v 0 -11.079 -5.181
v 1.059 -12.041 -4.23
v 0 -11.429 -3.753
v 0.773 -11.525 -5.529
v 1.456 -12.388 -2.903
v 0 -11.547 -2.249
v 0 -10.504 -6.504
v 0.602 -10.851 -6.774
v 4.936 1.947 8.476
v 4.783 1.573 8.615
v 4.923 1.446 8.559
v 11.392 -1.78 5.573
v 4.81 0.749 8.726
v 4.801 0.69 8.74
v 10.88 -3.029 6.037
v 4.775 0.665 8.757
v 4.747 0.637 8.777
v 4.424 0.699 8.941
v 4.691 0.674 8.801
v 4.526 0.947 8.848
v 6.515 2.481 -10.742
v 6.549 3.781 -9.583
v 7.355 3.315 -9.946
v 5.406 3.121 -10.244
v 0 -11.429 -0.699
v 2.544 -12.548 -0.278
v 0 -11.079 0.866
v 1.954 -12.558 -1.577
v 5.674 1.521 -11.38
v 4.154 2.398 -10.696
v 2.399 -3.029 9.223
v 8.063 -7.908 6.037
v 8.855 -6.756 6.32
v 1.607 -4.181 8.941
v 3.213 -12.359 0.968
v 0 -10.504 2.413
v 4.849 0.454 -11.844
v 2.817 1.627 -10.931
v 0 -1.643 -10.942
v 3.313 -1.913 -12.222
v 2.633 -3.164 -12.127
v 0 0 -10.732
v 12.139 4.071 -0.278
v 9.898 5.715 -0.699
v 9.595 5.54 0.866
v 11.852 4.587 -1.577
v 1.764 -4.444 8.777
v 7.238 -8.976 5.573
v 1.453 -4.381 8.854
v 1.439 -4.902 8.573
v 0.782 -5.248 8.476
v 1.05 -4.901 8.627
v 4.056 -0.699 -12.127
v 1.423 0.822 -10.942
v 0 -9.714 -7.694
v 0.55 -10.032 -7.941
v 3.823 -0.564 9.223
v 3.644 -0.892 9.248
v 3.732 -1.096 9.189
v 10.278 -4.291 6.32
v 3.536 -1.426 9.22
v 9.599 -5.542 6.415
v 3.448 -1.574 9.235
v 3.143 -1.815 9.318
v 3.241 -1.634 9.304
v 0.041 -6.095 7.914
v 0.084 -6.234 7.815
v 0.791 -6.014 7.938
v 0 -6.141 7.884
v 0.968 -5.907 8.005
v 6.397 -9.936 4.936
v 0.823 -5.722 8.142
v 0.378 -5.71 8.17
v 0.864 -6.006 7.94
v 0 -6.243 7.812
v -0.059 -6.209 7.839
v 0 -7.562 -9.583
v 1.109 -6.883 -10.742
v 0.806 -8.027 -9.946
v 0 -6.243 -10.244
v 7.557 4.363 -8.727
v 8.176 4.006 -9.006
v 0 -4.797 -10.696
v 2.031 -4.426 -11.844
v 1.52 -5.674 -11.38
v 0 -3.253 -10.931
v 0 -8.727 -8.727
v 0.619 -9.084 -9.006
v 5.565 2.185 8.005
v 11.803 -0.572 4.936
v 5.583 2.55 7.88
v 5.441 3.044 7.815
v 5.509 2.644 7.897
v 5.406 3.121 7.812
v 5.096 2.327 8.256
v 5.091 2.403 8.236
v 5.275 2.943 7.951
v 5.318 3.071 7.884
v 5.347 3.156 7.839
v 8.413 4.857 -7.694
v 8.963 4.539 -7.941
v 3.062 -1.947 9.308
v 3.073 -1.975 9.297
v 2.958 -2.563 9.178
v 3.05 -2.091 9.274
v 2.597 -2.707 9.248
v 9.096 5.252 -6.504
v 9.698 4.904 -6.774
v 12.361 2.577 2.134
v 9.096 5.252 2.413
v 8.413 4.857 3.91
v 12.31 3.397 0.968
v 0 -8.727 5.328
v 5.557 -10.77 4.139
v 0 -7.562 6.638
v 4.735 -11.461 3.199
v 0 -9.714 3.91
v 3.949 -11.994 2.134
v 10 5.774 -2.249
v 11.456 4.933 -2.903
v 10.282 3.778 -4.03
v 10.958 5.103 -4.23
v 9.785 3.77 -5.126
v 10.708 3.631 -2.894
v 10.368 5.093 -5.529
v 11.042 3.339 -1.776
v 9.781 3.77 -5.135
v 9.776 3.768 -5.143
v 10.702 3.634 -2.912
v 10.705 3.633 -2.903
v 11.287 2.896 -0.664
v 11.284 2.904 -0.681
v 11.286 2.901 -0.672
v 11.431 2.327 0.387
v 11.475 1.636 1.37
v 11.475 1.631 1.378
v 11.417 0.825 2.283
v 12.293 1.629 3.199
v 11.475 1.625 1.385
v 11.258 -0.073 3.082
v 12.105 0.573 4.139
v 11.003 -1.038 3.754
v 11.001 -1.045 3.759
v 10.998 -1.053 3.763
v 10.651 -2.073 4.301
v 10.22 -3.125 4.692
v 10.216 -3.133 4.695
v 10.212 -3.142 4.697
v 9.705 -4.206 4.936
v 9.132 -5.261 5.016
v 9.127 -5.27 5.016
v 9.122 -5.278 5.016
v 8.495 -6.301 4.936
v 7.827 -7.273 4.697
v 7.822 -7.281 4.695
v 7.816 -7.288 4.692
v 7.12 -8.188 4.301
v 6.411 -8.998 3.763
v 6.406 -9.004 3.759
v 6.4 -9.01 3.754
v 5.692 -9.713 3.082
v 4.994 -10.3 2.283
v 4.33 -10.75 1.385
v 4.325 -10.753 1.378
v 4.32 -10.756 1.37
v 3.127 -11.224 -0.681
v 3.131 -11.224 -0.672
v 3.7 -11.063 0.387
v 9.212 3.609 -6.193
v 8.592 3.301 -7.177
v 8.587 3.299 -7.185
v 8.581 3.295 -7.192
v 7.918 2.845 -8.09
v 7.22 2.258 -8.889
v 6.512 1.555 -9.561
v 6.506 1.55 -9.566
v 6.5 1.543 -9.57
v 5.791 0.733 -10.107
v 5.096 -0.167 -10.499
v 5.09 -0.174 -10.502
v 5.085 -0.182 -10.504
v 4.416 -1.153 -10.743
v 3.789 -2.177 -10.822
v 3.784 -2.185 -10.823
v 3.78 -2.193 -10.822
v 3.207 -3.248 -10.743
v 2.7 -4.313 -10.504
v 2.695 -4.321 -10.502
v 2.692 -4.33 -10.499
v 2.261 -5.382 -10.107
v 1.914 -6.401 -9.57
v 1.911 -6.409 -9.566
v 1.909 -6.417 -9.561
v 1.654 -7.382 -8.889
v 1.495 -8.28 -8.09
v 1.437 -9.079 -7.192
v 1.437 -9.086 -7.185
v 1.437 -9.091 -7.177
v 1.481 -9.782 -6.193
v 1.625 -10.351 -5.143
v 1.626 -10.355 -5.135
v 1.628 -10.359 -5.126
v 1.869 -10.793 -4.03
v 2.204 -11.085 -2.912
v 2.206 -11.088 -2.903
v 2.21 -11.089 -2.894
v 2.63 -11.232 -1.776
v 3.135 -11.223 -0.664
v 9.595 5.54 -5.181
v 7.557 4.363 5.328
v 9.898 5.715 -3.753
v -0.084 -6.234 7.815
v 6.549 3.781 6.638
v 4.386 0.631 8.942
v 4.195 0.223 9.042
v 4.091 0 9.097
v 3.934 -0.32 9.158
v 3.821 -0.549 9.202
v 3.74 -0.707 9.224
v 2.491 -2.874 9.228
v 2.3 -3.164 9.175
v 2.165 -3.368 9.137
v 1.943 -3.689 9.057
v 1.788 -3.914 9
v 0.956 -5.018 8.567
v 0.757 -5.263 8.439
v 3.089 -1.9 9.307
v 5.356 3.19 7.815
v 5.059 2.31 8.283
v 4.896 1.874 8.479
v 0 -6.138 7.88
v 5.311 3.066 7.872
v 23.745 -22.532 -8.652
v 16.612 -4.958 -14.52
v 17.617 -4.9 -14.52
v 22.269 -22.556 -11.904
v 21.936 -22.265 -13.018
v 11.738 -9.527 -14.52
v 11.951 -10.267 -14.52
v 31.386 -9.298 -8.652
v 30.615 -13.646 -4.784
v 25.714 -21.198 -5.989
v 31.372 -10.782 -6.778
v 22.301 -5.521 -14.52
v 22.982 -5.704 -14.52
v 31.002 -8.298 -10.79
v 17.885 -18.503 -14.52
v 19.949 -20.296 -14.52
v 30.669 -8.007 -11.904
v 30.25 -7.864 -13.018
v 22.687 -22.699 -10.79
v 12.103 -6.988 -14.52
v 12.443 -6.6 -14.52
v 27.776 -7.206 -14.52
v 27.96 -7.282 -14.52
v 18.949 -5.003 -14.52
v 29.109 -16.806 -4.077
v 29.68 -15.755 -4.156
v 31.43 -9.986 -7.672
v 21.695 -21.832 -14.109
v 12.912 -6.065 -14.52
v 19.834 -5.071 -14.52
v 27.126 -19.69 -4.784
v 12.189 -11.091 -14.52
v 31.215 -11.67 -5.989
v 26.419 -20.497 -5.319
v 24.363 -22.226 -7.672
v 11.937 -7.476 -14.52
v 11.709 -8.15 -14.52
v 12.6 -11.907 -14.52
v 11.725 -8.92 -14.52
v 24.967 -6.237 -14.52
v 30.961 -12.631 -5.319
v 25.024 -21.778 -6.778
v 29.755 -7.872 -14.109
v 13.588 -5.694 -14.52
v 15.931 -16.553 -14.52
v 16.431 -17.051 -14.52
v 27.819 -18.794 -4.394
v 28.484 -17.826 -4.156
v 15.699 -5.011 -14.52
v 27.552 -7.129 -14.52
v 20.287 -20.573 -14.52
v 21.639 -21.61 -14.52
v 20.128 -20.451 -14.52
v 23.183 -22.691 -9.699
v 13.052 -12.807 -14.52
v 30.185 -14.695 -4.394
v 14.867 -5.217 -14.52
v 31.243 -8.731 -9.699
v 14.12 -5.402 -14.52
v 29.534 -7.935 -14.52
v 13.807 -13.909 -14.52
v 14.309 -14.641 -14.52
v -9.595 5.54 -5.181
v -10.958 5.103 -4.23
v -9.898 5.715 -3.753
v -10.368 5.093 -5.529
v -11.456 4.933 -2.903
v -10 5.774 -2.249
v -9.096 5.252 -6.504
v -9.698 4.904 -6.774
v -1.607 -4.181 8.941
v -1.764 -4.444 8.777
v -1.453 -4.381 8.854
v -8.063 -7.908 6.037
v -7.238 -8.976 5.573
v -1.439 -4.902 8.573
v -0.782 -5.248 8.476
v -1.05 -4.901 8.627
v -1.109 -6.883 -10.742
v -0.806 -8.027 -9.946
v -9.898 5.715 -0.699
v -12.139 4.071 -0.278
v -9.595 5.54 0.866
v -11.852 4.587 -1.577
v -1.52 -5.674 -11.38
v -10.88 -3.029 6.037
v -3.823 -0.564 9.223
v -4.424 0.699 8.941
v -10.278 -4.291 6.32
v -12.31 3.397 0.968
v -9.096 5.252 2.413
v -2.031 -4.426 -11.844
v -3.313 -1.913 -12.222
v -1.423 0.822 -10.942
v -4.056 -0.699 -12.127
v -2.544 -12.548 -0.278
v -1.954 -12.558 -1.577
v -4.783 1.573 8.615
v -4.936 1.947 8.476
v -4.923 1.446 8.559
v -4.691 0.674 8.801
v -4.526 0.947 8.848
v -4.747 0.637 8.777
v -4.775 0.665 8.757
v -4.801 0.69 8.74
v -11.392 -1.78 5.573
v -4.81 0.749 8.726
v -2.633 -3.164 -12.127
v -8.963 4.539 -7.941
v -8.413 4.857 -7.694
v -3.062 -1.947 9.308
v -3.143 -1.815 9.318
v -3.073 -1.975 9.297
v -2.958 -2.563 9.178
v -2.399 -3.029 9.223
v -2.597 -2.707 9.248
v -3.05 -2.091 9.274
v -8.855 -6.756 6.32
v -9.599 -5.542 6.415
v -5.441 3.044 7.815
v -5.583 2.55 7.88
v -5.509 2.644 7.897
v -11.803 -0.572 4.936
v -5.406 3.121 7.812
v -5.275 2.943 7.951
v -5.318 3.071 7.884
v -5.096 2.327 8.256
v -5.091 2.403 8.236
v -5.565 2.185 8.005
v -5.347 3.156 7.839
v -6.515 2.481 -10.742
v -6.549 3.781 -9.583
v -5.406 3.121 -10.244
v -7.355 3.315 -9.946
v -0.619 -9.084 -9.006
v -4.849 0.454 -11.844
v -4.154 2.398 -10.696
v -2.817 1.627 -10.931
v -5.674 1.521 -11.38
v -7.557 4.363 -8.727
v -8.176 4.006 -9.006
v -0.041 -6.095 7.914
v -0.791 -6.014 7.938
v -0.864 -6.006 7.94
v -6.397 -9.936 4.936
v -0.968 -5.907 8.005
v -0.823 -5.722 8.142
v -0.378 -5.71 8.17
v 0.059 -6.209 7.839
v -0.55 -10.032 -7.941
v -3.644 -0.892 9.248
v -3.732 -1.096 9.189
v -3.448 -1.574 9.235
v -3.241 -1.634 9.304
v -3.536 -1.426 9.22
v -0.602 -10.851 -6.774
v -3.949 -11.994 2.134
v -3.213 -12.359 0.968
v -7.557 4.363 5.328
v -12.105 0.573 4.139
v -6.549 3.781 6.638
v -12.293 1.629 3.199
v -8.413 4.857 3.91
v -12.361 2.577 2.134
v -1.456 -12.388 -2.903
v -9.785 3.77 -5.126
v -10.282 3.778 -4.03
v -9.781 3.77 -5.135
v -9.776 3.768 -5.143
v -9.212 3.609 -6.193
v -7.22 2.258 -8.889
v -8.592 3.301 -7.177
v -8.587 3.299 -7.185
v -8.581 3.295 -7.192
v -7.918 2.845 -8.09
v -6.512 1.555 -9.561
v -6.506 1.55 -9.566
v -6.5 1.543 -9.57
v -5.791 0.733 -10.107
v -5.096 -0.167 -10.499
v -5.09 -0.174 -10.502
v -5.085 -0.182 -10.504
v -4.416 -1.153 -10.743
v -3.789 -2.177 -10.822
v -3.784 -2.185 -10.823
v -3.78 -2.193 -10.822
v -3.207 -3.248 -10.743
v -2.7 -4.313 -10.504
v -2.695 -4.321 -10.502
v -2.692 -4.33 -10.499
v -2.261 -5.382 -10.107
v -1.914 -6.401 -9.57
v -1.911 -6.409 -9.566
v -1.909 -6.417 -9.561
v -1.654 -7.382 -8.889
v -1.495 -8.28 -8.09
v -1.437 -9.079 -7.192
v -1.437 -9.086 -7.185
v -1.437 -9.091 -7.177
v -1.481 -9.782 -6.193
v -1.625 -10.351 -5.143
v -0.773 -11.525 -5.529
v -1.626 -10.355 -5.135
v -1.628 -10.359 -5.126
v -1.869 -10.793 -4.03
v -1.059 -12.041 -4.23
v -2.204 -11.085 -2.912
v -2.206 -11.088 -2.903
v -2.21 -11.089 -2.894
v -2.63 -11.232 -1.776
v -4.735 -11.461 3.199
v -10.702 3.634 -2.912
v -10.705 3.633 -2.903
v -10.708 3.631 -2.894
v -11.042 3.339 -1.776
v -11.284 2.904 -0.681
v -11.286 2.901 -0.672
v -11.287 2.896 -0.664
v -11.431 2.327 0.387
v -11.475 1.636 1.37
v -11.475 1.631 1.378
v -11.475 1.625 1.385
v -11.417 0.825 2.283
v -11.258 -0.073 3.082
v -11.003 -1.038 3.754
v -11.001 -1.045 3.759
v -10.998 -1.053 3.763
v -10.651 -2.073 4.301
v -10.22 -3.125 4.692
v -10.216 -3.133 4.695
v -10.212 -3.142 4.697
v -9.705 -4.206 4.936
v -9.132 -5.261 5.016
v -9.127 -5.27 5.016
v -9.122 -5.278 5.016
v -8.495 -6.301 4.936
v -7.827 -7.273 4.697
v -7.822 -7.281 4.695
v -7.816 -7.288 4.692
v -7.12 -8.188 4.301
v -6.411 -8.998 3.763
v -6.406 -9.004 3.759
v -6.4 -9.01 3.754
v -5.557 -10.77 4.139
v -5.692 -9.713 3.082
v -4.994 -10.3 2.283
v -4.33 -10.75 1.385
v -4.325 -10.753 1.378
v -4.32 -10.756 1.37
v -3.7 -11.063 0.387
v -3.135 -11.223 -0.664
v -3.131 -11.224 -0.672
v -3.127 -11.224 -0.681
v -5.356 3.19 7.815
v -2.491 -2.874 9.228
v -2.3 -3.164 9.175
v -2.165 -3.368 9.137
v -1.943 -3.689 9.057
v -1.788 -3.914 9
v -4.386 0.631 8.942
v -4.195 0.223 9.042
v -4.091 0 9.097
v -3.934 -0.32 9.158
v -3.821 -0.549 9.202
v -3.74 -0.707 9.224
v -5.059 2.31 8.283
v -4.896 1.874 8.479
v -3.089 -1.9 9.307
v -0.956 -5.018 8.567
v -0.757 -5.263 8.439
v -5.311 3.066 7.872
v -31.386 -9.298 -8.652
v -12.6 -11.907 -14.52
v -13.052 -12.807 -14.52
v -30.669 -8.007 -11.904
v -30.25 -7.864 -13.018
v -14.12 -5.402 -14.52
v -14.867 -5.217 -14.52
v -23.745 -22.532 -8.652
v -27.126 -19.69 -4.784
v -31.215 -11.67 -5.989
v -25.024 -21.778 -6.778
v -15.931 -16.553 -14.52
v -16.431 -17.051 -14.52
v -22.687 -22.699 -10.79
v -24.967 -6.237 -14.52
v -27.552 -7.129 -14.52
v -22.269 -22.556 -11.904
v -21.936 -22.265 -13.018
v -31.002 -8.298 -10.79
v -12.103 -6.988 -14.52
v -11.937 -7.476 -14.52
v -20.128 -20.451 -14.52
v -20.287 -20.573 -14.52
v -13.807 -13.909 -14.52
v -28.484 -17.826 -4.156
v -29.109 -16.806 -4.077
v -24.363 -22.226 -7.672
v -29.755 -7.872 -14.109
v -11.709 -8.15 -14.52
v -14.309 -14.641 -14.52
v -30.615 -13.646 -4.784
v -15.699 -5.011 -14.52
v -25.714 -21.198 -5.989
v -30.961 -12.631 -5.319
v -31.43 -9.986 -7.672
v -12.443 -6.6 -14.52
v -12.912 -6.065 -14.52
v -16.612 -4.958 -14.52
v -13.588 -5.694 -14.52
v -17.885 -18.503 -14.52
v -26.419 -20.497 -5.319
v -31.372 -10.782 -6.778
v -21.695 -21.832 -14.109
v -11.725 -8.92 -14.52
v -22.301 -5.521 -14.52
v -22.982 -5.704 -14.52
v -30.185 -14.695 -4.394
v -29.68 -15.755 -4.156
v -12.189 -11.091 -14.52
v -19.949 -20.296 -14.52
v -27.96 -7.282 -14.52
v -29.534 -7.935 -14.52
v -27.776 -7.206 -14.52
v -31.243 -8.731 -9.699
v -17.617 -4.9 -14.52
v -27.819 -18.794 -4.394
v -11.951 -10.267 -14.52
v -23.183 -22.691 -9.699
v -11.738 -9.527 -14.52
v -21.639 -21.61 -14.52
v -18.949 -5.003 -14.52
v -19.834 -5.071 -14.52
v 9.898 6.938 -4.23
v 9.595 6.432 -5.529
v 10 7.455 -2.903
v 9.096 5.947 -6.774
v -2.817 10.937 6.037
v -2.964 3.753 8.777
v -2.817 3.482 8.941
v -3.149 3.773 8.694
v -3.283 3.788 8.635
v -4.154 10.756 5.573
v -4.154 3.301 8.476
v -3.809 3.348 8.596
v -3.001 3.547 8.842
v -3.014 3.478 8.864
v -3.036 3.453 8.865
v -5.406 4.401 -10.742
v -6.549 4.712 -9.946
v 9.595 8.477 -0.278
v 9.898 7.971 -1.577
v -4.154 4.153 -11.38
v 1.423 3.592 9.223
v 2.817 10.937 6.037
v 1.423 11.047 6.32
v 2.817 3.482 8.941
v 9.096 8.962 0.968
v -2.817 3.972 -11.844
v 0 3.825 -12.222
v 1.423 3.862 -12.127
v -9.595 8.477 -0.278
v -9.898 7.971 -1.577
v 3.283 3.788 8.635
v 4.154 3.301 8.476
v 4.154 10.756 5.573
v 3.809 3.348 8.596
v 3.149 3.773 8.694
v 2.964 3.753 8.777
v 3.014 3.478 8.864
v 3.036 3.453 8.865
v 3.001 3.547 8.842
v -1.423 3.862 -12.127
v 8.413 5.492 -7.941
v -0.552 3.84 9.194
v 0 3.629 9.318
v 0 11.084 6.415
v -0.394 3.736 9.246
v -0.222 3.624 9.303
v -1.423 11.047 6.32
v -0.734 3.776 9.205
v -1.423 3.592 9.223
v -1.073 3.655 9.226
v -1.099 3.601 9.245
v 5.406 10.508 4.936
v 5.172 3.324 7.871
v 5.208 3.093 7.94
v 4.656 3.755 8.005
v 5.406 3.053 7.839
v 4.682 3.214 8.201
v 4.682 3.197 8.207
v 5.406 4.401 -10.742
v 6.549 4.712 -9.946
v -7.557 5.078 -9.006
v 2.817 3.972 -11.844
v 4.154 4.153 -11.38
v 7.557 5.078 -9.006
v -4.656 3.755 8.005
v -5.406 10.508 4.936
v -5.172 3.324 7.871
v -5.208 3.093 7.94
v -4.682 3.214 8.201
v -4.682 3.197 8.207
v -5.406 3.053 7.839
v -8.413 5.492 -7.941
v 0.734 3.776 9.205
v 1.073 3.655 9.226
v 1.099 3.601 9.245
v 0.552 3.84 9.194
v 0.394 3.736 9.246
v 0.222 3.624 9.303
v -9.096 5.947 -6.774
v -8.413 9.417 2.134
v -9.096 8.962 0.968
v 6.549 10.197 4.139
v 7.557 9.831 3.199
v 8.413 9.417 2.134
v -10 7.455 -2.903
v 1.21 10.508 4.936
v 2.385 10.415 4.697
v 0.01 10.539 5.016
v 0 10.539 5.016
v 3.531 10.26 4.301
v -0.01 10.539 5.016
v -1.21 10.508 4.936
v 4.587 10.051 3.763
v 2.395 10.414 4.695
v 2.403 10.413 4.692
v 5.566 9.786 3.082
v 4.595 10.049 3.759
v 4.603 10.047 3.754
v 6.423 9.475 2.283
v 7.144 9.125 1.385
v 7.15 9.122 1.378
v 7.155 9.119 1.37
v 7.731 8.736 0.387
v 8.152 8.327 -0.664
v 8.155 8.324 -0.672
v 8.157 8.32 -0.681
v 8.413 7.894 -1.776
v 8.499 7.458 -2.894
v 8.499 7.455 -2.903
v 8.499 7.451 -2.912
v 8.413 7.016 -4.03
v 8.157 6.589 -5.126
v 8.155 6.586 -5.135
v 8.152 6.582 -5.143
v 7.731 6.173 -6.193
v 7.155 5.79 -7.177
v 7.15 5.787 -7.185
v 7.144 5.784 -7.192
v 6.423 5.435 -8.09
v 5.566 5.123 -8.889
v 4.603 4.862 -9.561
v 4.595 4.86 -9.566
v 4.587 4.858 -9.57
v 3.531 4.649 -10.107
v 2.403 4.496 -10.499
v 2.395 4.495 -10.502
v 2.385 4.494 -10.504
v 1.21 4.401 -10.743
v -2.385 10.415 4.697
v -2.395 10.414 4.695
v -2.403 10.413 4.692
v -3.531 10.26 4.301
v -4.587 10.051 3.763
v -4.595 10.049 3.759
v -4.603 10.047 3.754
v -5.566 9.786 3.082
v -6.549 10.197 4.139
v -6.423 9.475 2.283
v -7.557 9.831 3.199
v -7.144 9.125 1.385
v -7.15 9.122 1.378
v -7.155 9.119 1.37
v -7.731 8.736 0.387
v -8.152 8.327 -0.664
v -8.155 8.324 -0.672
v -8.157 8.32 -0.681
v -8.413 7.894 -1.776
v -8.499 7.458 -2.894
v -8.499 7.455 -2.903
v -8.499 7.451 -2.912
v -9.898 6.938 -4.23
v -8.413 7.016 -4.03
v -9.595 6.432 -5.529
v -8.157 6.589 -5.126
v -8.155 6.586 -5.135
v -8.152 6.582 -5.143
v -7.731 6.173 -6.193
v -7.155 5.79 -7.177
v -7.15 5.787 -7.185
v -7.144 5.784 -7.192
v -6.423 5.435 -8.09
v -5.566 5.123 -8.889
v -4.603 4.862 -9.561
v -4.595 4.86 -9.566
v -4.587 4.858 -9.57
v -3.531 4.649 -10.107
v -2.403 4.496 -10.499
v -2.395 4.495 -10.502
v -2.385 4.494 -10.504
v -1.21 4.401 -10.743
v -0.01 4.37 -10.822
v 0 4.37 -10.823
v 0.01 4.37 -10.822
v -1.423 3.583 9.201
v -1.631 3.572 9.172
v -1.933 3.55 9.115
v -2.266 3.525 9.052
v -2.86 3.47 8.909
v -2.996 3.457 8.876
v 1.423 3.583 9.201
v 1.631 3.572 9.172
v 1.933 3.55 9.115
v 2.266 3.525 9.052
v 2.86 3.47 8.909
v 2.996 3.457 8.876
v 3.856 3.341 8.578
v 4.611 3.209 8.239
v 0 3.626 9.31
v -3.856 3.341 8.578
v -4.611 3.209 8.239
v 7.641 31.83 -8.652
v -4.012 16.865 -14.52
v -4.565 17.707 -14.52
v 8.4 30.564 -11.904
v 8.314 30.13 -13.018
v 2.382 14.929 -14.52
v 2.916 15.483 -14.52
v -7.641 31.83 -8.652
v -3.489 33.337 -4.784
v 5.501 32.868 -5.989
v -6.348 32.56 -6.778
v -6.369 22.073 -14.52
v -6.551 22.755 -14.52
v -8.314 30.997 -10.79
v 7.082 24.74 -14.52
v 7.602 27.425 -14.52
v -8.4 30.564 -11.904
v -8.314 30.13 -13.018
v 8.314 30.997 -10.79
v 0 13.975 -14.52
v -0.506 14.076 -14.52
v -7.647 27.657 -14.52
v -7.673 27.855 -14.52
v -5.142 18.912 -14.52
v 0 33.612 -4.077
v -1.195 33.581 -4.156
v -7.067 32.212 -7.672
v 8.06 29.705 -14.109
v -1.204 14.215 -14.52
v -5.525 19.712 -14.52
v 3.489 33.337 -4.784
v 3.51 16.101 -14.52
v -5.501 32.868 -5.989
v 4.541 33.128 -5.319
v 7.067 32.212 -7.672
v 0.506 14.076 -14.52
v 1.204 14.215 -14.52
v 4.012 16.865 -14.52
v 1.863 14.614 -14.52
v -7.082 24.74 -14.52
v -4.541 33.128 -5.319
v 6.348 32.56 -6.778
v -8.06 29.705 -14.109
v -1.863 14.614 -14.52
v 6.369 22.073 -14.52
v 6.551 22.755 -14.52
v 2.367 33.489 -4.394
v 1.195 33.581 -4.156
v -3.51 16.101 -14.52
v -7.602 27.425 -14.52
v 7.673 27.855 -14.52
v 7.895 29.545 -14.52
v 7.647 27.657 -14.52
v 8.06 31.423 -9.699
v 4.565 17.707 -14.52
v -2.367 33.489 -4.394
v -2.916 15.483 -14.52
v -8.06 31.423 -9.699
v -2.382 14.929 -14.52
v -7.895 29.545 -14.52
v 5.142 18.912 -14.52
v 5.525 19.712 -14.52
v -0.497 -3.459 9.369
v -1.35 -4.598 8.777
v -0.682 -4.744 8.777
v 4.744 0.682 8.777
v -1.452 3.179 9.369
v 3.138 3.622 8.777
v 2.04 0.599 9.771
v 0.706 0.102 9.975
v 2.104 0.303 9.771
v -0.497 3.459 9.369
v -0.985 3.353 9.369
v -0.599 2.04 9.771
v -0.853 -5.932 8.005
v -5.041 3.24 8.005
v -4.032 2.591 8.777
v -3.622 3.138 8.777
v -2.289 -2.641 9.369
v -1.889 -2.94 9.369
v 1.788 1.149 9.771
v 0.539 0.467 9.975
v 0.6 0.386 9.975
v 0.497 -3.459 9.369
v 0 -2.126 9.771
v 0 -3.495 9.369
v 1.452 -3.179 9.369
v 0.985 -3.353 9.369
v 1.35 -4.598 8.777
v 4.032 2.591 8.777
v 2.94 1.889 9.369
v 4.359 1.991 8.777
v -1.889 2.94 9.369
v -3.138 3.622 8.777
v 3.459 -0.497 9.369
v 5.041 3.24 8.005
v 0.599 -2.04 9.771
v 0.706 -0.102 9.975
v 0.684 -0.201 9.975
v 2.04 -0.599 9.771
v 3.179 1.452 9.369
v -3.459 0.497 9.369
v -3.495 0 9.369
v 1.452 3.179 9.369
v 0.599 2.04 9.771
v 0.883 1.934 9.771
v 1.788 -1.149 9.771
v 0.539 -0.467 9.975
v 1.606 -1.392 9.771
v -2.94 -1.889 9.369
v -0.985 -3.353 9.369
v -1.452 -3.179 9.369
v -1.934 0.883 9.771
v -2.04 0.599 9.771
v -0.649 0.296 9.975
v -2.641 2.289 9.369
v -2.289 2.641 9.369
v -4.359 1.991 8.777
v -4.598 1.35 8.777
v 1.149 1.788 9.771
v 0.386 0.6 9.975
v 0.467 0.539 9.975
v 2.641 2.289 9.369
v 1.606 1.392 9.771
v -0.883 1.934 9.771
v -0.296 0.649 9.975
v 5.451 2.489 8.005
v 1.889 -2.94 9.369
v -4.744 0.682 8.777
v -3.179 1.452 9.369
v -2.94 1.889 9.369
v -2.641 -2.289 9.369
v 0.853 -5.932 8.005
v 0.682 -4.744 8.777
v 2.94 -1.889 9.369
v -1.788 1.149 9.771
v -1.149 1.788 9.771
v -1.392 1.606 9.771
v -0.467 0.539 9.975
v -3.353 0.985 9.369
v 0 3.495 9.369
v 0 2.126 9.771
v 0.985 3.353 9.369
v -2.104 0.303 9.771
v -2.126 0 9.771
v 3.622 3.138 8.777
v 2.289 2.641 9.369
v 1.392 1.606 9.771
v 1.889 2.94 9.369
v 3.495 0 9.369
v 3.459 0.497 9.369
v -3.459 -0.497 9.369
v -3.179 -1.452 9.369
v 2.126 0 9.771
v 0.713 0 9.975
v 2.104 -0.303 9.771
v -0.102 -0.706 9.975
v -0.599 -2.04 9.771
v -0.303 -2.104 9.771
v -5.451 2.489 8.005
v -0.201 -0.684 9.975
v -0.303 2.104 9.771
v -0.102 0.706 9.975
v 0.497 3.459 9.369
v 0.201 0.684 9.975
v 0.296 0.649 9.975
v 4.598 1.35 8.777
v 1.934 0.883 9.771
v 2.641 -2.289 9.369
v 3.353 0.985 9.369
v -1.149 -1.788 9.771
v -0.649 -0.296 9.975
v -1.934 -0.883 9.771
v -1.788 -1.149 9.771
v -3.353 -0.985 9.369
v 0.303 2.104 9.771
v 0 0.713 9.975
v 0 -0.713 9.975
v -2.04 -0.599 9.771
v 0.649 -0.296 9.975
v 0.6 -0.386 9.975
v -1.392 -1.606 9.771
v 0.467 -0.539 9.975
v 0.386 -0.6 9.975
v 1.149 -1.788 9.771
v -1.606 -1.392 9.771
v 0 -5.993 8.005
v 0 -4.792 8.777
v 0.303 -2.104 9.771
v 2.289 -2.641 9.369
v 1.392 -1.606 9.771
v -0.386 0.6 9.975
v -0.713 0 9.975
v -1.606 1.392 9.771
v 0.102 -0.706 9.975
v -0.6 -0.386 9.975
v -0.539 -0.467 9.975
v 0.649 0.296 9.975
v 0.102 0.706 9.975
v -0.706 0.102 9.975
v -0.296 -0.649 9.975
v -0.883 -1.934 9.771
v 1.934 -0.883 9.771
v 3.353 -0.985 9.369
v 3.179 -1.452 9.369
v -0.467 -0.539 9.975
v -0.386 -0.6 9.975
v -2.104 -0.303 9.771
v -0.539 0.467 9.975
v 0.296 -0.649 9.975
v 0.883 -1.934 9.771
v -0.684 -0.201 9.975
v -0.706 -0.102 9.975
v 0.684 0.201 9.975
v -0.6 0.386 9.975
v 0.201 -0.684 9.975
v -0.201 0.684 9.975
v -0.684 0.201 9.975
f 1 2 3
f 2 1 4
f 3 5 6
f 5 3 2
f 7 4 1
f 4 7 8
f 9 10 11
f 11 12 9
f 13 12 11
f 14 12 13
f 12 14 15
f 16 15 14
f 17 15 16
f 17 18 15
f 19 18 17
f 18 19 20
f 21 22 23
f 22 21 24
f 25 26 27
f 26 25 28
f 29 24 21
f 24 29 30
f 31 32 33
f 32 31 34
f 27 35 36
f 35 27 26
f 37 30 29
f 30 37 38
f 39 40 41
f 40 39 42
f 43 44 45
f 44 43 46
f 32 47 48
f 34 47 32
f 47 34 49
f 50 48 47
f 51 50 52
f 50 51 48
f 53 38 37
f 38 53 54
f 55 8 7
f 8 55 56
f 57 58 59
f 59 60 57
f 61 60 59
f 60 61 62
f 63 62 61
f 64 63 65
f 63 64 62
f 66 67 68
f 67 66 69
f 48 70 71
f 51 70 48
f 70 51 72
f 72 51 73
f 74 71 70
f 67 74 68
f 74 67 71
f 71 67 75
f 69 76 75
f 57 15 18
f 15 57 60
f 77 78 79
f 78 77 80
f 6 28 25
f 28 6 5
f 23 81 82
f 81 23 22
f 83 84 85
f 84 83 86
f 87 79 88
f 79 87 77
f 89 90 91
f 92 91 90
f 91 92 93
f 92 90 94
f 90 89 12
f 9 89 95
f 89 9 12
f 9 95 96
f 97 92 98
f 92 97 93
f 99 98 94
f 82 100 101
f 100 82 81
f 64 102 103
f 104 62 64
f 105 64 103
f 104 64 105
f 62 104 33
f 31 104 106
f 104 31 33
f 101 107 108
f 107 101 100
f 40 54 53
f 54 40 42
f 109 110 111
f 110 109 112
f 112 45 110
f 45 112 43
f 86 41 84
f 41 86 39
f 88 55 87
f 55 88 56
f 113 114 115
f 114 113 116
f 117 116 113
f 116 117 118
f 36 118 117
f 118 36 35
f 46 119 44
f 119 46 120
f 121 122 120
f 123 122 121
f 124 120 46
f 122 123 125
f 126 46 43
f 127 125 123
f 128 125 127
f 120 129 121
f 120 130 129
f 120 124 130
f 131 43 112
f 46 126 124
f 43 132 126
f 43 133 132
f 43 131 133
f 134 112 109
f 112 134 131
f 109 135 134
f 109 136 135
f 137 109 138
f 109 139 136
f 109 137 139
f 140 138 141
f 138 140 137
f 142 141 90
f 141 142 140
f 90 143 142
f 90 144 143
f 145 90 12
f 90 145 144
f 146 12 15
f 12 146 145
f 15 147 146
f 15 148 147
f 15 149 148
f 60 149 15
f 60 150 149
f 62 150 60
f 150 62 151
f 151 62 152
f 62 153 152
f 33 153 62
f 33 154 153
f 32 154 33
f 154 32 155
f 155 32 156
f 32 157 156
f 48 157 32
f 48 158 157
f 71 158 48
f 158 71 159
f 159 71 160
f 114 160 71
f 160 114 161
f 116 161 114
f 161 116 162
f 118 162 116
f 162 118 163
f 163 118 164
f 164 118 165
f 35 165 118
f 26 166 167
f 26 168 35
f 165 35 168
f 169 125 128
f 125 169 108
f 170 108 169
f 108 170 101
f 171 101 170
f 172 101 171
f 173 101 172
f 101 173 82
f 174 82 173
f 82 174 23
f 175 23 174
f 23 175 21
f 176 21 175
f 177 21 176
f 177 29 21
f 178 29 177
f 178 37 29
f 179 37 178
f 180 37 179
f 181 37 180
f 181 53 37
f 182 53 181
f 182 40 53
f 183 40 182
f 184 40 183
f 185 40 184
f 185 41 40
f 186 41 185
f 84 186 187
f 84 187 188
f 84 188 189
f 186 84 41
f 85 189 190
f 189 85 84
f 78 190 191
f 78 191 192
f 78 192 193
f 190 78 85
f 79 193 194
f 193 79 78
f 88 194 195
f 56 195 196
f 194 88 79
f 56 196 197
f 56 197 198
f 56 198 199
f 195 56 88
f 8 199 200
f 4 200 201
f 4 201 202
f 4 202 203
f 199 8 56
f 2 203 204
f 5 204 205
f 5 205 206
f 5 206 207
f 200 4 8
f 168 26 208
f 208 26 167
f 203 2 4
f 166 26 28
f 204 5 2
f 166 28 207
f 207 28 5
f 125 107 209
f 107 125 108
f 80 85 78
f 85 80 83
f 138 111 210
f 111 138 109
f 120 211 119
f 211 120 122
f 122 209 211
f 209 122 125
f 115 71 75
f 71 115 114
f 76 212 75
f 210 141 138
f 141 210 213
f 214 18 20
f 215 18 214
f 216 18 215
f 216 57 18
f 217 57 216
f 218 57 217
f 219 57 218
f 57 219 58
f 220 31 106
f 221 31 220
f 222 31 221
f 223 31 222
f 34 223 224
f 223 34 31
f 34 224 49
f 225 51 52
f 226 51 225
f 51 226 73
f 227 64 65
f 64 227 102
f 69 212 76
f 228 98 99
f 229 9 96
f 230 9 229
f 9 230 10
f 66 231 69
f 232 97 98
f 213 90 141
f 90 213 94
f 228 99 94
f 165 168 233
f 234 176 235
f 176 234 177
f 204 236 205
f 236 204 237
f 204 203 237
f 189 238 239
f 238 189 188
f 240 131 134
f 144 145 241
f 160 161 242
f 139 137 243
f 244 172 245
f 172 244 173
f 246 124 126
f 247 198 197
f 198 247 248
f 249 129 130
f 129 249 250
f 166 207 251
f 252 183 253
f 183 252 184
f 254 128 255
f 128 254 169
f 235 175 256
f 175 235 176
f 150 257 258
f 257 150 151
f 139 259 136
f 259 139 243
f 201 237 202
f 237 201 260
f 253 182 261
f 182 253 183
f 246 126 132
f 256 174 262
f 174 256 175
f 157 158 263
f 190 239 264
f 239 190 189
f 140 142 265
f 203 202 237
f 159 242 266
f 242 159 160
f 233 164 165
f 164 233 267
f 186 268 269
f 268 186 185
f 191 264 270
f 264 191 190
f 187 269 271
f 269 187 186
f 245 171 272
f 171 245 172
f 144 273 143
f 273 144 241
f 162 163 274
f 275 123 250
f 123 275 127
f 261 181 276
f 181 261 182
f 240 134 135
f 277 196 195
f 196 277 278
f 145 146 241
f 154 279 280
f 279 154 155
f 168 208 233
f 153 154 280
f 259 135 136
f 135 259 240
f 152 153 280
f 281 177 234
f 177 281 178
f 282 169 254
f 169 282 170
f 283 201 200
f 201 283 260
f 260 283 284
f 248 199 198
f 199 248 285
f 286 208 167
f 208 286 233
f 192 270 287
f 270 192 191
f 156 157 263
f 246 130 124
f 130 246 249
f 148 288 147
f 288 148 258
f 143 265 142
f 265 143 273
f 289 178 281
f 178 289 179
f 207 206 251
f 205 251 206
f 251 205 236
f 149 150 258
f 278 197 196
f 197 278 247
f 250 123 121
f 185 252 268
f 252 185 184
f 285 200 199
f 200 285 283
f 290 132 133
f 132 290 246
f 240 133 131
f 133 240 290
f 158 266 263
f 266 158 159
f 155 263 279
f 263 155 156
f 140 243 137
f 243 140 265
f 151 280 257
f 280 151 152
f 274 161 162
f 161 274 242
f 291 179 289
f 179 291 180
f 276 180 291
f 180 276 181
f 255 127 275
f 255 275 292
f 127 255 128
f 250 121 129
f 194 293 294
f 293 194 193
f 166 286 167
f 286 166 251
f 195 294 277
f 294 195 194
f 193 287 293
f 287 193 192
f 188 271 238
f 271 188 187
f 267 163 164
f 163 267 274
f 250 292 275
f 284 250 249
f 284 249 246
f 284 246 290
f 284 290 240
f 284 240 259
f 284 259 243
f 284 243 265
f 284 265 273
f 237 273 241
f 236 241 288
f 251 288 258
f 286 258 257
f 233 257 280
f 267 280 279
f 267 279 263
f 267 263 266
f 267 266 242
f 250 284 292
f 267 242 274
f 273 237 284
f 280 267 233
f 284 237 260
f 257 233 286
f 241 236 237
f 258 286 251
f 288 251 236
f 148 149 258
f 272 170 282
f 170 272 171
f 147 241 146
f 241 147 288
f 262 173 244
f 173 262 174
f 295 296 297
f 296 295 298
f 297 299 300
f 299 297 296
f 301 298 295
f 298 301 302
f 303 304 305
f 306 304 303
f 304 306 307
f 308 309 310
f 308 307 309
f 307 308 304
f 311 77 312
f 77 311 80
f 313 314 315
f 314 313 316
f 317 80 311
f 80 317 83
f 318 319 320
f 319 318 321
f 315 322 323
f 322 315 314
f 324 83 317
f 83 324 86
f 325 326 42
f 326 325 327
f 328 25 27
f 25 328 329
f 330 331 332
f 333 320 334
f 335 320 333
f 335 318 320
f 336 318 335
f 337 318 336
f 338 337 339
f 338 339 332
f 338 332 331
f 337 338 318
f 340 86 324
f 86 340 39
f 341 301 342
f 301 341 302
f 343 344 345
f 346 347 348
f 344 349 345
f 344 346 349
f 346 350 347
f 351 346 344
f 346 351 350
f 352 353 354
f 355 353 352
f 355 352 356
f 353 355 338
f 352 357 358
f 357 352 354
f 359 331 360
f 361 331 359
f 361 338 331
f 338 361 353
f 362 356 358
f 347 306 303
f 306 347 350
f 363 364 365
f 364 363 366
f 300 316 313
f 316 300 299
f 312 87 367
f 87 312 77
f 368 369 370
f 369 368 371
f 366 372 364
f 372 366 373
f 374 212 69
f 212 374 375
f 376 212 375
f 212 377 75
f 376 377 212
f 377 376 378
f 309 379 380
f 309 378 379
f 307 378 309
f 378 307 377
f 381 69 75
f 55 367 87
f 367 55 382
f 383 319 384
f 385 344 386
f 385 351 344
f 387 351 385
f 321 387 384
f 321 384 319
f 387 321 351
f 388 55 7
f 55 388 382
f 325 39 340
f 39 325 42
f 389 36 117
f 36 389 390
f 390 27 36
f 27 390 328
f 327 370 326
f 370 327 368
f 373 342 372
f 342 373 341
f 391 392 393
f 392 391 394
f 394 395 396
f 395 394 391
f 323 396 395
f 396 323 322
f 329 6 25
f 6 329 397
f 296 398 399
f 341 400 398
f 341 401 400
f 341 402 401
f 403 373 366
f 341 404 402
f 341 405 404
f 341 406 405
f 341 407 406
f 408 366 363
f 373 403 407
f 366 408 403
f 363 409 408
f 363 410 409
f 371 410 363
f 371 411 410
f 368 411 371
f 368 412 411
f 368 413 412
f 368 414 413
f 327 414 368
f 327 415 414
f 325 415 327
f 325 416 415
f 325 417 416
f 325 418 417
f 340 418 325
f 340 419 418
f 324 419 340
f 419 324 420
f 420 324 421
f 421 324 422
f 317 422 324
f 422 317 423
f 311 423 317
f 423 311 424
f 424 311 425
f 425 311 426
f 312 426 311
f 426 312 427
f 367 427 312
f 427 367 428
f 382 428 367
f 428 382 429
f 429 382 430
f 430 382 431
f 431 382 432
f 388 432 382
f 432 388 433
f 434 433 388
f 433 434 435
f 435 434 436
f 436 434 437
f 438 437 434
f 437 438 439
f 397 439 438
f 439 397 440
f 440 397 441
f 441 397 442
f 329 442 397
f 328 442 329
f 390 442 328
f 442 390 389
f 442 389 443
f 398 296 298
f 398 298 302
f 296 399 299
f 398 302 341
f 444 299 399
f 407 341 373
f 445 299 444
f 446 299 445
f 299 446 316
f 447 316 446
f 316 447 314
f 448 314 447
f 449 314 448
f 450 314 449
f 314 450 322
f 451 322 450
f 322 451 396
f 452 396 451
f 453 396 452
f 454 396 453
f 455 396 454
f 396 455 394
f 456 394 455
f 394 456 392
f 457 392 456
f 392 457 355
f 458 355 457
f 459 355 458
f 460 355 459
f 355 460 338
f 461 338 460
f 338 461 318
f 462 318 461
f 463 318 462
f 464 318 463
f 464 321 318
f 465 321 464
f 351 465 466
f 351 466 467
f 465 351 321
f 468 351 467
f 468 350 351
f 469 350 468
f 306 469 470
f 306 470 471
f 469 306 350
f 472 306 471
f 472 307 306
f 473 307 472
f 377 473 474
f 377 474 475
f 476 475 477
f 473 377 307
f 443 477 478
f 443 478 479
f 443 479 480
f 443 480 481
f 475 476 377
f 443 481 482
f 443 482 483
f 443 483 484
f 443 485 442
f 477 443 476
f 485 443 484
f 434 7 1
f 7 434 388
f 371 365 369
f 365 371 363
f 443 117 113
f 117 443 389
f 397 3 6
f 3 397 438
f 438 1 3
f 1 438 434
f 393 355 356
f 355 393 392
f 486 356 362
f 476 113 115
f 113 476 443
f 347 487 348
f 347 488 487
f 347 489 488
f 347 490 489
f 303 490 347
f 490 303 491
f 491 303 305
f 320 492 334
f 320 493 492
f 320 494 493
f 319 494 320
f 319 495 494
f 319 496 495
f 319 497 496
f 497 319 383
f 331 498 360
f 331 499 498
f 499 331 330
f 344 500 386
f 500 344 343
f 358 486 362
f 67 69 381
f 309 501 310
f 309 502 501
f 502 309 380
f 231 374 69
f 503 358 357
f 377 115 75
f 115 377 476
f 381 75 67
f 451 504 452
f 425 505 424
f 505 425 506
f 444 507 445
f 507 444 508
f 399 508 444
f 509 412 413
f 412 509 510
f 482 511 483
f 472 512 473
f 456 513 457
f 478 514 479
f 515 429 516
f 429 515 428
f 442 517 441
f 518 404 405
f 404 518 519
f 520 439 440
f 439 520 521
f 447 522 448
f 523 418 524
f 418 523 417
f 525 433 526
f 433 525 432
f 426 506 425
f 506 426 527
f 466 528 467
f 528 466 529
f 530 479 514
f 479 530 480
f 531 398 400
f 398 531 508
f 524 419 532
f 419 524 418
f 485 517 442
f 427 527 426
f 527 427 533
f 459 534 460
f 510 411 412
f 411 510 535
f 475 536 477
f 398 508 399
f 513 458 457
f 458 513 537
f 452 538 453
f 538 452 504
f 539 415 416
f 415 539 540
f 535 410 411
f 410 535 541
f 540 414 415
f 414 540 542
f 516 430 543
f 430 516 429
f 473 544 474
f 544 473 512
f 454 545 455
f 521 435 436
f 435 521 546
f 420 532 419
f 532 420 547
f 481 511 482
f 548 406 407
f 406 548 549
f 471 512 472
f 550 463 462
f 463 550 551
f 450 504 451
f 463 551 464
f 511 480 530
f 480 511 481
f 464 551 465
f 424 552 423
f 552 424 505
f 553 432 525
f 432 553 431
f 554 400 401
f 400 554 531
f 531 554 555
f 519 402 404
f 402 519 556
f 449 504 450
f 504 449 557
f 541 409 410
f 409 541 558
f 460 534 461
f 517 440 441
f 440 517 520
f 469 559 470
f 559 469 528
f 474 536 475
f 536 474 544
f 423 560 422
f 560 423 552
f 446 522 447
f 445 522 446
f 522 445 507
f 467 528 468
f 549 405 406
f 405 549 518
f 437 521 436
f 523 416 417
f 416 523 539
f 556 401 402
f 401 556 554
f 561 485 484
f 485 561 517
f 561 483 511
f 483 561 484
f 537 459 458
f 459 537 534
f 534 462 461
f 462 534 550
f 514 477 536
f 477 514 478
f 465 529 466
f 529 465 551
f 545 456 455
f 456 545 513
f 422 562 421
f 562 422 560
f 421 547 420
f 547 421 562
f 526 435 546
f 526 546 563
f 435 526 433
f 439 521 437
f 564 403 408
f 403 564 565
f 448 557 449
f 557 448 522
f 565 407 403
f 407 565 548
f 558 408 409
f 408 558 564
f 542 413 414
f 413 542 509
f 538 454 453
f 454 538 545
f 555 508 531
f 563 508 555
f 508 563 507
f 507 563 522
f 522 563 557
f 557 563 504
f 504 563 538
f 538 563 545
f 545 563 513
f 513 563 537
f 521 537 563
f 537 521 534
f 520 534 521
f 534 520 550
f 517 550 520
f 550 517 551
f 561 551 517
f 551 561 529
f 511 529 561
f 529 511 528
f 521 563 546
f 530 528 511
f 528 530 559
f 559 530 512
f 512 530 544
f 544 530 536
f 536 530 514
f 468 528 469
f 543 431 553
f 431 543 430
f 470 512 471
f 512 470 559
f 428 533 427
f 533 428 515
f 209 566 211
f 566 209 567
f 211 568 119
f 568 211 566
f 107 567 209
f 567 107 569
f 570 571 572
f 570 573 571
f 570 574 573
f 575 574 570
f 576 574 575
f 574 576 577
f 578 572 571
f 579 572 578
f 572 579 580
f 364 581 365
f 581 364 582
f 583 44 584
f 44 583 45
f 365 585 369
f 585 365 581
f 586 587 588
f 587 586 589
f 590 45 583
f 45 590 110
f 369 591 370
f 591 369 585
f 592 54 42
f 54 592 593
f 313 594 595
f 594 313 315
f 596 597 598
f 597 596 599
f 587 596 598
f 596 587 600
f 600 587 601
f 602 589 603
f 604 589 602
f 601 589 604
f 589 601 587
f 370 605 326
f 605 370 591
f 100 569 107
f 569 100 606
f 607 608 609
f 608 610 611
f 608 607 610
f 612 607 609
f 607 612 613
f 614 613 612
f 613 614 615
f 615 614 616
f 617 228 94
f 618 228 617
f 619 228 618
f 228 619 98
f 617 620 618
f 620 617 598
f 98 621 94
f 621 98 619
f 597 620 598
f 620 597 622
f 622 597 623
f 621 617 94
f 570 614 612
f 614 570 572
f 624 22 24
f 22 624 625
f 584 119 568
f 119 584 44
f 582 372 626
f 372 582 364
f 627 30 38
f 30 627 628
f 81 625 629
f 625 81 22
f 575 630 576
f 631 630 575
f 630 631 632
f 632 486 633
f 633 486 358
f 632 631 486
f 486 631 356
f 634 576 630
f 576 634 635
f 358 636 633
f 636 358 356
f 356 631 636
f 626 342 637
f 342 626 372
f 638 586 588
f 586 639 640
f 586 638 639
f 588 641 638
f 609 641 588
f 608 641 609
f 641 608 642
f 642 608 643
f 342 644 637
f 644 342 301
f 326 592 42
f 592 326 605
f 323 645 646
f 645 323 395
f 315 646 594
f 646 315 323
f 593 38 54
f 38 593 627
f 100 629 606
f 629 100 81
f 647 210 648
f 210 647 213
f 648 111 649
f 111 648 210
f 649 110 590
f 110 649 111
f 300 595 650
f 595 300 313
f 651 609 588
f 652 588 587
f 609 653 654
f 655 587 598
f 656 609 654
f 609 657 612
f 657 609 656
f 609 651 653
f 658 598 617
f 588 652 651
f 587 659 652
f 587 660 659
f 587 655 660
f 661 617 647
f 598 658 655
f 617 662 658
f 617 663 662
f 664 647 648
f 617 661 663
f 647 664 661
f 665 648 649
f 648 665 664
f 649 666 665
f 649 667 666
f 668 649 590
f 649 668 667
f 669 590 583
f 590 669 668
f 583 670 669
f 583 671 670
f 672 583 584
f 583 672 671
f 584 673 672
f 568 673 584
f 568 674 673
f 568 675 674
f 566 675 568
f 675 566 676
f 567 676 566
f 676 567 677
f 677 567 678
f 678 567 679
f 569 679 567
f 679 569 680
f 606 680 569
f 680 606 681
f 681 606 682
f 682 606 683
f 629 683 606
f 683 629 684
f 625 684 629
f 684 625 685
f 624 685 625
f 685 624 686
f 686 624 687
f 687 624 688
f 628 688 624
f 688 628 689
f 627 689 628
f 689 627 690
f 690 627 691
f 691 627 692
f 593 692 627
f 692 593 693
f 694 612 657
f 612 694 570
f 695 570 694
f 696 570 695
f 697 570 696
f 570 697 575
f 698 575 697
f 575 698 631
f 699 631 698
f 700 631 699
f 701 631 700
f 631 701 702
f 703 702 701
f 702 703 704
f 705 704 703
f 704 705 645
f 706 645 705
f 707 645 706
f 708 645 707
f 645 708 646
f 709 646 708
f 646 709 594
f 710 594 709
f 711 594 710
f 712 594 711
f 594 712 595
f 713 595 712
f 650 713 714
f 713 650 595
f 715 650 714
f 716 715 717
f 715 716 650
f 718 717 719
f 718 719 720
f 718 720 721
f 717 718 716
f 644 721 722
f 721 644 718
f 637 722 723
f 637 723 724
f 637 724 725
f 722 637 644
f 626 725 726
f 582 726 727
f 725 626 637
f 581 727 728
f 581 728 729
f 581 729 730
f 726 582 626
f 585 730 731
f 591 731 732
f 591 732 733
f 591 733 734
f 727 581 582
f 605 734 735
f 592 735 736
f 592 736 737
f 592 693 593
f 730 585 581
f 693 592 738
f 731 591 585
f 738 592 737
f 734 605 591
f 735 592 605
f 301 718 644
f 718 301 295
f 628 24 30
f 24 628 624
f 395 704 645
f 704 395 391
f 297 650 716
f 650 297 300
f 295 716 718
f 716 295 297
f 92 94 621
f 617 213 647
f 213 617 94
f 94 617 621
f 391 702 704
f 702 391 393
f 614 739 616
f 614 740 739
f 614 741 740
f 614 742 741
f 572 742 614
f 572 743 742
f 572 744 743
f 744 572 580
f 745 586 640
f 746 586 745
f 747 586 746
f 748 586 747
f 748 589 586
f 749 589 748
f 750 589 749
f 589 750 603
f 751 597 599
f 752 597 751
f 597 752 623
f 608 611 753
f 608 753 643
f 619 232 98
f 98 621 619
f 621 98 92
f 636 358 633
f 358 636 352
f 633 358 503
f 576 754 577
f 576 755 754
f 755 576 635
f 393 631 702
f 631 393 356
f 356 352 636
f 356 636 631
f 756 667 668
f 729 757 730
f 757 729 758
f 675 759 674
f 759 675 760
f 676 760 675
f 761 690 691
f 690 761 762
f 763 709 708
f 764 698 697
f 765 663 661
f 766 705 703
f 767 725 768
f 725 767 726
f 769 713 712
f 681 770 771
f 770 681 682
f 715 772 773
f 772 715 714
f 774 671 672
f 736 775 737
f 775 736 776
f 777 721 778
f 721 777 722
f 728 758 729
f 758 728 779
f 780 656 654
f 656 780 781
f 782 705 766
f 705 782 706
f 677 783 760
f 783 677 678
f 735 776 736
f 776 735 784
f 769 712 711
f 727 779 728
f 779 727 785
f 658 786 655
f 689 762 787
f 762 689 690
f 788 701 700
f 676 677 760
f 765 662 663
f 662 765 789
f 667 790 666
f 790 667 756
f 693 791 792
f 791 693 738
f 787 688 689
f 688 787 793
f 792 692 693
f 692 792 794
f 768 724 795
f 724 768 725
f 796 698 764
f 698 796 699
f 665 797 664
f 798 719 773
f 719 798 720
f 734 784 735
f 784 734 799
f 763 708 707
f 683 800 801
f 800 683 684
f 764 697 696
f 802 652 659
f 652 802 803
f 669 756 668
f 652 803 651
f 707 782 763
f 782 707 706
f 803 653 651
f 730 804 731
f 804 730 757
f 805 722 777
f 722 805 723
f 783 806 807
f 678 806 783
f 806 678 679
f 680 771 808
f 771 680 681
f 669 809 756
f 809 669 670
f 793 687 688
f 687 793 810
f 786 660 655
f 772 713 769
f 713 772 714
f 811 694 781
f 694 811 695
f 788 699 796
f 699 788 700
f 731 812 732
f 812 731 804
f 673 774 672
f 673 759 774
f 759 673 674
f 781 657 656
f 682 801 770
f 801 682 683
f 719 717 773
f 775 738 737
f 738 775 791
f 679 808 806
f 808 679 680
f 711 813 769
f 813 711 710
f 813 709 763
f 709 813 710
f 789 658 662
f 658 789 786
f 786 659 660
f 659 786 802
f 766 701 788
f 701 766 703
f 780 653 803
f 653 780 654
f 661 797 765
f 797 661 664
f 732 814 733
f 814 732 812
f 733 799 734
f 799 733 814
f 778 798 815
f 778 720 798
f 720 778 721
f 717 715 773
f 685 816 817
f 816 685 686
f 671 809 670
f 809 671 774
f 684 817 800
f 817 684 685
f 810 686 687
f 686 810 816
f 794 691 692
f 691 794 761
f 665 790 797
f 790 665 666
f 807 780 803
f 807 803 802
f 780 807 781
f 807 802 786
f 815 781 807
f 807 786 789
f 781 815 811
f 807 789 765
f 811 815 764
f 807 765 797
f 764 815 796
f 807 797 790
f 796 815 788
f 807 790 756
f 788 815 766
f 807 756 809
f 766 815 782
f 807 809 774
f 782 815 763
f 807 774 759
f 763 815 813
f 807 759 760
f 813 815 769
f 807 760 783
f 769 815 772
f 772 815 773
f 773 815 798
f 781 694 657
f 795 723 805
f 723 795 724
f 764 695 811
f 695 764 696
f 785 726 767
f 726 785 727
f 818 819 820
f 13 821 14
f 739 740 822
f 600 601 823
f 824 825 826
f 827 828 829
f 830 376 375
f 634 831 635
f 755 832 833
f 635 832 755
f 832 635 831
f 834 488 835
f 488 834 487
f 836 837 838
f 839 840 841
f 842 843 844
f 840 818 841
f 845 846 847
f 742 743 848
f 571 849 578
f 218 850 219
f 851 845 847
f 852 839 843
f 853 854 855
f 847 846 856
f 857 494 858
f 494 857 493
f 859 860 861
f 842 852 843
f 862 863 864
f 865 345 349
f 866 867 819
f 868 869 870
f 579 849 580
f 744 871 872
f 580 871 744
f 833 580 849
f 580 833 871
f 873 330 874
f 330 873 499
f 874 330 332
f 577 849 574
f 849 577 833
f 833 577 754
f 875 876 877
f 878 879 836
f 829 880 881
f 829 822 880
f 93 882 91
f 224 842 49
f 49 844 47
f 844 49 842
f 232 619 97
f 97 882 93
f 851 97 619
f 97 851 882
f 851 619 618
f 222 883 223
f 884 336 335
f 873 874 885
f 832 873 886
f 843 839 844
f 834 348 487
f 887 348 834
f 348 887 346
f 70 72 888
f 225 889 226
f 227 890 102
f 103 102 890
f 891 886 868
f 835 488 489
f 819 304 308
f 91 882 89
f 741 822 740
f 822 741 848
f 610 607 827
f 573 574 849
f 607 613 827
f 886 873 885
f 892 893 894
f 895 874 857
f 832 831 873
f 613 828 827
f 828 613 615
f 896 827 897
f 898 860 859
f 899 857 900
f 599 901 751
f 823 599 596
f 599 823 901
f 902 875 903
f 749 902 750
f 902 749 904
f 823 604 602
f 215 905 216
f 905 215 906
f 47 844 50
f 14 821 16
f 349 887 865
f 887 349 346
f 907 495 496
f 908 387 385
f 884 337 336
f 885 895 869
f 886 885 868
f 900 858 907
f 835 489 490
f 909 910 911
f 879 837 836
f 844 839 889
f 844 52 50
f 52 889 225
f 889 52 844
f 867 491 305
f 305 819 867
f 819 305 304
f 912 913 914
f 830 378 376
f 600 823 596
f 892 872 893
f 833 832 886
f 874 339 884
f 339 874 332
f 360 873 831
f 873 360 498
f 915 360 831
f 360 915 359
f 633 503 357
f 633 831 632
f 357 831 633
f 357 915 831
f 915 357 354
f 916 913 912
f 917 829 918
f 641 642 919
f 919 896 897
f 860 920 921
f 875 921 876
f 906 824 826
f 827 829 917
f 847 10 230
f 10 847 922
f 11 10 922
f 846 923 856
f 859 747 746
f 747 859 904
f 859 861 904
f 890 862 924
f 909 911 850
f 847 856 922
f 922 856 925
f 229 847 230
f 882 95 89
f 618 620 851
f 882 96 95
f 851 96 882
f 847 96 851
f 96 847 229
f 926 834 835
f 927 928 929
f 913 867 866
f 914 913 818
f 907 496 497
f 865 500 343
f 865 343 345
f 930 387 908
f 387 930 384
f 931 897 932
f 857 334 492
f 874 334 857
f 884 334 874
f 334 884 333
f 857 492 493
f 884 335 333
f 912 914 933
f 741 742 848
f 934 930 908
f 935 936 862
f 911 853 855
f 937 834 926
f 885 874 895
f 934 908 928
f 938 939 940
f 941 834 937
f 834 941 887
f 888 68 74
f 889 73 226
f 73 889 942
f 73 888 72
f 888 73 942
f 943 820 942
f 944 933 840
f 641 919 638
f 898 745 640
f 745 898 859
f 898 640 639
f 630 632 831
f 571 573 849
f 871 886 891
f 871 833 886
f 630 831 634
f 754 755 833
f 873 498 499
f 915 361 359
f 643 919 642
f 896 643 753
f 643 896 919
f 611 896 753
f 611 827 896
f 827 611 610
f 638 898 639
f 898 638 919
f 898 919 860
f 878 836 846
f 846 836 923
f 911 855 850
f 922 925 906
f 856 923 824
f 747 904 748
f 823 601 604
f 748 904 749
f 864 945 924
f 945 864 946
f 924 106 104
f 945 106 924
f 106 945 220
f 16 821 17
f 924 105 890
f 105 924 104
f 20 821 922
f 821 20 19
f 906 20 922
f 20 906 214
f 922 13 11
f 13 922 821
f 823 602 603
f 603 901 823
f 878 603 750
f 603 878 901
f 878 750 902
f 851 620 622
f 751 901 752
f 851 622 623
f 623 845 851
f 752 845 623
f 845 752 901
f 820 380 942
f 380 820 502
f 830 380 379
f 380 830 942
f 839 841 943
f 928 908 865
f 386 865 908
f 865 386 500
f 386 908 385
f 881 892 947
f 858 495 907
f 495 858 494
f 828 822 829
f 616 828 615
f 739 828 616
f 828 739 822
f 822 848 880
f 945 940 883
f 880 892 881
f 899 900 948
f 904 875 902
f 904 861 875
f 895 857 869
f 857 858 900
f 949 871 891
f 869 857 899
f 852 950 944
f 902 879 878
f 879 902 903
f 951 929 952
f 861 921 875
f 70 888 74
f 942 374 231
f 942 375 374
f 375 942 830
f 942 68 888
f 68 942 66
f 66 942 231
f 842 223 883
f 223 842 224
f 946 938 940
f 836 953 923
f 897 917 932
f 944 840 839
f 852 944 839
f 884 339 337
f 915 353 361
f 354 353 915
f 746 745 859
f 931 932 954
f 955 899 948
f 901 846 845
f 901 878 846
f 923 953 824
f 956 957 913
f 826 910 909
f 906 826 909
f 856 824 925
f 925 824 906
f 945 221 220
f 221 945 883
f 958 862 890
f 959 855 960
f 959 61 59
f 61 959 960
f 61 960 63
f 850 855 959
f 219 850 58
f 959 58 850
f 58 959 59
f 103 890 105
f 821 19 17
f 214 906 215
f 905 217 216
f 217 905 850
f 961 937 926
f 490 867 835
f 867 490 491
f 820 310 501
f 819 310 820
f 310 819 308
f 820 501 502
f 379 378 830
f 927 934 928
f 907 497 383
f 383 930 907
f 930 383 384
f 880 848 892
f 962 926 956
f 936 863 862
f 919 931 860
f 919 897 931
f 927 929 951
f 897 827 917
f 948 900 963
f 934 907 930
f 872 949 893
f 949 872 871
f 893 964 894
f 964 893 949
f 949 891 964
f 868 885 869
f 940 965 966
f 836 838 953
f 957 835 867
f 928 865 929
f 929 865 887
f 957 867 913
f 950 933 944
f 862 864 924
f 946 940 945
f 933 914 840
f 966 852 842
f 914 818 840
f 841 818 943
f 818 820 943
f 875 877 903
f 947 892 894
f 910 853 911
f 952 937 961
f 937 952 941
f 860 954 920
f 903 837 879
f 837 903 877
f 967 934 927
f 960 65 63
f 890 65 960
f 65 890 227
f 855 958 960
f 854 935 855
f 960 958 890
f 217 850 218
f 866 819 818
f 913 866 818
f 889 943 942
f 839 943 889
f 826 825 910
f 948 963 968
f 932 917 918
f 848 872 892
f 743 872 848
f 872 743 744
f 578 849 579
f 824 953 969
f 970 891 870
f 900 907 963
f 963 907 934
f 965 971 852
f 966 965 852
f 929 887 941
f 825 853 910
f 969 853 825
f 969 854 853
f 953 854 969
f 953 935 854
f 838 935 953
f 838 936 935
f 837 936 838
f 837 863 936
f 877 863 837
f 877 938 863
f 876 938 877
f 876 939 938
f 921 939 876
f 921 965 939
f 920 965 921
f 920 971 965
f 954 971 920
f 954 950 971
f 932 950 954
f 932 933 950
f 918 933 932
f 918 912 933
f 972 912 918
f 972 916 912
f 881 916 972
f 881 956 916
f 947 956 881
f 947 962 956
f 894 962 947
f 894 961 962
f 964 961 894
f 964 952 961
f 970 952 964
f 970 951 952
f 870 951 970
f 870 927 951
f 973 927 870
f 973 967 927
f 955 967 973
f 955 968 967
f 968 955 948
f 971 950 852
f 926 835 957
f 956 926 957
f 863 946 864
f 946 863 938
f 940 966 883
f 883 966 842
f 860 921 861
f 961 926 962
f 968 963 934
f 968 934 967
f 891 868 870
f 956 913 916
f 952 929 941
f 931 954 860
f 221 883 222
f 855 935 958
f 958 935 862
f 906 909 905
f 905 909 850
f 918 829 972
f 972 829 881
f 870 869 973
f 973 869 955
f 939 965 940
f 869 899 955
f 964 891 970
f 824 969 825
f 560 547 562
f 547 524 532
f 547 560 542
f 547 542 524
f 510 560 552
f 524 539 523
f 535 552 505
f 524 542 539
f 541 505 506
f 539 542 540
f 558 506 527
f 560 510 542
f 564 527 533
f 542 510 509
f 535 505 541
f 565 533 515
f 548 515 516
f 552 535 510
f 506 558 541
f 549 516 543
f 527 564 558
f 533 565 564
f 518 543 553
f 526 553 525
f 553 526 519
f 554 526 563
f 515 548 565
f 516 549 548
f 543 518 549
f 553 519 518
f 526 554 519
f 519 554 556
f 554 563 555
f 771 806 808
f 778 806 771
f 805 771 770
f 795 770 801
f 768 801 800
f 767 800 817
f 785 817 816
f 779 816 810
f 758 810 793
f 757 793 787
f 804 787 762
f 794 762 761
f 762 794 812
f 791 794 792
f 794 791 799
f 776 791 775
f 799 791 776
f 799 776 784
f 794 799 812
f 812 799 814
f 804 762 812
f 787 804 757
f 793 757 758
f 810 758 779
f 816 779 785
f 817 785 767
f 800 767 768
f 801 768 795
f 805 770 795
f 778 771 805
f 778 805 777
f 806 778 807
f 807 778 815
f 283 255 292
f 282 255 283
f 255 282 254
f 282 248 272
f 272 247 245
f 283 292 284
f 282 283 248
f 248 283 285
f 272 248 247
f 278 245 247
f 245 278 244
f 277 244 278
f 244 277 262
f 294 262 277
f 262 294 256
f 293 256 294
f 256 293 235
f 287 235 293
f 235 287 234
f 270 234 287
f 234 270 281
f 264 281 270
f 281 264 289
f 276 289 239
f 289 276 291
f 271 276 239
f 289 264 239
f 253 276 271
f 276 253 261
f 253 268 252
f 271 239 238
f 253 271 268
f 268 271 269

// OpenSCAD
// Connecteur Dodécaèdre D20

version = 2;

r = 17/2; // V1:17.4
rTrou = 4;
rayonCol = 1.5;
longueurCol= 8;
longueurEmbout = 25;
$fn=44;
// angle = 90-31.7174744;
// angle = 180-116.56;
angle = 68.72;
angleCube = -120*72/108;
echo(angleCube=angleCube);

rotate([180, 0, 0])

union() {
    difference() {
        union() {
            embouts();
            sphere(r+rayonCol);
        }
        // découpe base
        translate([0, 0, 0.44*(longueurCol+longueurEmbout)])
            cylinder(10, 50, 50);
    }
}

module embouts() {
    for (i = [1:3]) {
        rotate([0, 0, i*360/3])
        rotate([angle, 0, 0])
        embout(i);
        // rotate([0, 0, i*360/3+angleCube])
        // rotate([54.72, 0, 0])
        // embout(i);
    }
}

module embout(i) {
    difference() {
        union() {
            cylinder(longueurCol, r+rayonCol, r+rayonCol);
            translate([0, 0, longueurCol-0.2])
            cylinder(longueurEmbout, r, r-0.1);
        }
    }
}
